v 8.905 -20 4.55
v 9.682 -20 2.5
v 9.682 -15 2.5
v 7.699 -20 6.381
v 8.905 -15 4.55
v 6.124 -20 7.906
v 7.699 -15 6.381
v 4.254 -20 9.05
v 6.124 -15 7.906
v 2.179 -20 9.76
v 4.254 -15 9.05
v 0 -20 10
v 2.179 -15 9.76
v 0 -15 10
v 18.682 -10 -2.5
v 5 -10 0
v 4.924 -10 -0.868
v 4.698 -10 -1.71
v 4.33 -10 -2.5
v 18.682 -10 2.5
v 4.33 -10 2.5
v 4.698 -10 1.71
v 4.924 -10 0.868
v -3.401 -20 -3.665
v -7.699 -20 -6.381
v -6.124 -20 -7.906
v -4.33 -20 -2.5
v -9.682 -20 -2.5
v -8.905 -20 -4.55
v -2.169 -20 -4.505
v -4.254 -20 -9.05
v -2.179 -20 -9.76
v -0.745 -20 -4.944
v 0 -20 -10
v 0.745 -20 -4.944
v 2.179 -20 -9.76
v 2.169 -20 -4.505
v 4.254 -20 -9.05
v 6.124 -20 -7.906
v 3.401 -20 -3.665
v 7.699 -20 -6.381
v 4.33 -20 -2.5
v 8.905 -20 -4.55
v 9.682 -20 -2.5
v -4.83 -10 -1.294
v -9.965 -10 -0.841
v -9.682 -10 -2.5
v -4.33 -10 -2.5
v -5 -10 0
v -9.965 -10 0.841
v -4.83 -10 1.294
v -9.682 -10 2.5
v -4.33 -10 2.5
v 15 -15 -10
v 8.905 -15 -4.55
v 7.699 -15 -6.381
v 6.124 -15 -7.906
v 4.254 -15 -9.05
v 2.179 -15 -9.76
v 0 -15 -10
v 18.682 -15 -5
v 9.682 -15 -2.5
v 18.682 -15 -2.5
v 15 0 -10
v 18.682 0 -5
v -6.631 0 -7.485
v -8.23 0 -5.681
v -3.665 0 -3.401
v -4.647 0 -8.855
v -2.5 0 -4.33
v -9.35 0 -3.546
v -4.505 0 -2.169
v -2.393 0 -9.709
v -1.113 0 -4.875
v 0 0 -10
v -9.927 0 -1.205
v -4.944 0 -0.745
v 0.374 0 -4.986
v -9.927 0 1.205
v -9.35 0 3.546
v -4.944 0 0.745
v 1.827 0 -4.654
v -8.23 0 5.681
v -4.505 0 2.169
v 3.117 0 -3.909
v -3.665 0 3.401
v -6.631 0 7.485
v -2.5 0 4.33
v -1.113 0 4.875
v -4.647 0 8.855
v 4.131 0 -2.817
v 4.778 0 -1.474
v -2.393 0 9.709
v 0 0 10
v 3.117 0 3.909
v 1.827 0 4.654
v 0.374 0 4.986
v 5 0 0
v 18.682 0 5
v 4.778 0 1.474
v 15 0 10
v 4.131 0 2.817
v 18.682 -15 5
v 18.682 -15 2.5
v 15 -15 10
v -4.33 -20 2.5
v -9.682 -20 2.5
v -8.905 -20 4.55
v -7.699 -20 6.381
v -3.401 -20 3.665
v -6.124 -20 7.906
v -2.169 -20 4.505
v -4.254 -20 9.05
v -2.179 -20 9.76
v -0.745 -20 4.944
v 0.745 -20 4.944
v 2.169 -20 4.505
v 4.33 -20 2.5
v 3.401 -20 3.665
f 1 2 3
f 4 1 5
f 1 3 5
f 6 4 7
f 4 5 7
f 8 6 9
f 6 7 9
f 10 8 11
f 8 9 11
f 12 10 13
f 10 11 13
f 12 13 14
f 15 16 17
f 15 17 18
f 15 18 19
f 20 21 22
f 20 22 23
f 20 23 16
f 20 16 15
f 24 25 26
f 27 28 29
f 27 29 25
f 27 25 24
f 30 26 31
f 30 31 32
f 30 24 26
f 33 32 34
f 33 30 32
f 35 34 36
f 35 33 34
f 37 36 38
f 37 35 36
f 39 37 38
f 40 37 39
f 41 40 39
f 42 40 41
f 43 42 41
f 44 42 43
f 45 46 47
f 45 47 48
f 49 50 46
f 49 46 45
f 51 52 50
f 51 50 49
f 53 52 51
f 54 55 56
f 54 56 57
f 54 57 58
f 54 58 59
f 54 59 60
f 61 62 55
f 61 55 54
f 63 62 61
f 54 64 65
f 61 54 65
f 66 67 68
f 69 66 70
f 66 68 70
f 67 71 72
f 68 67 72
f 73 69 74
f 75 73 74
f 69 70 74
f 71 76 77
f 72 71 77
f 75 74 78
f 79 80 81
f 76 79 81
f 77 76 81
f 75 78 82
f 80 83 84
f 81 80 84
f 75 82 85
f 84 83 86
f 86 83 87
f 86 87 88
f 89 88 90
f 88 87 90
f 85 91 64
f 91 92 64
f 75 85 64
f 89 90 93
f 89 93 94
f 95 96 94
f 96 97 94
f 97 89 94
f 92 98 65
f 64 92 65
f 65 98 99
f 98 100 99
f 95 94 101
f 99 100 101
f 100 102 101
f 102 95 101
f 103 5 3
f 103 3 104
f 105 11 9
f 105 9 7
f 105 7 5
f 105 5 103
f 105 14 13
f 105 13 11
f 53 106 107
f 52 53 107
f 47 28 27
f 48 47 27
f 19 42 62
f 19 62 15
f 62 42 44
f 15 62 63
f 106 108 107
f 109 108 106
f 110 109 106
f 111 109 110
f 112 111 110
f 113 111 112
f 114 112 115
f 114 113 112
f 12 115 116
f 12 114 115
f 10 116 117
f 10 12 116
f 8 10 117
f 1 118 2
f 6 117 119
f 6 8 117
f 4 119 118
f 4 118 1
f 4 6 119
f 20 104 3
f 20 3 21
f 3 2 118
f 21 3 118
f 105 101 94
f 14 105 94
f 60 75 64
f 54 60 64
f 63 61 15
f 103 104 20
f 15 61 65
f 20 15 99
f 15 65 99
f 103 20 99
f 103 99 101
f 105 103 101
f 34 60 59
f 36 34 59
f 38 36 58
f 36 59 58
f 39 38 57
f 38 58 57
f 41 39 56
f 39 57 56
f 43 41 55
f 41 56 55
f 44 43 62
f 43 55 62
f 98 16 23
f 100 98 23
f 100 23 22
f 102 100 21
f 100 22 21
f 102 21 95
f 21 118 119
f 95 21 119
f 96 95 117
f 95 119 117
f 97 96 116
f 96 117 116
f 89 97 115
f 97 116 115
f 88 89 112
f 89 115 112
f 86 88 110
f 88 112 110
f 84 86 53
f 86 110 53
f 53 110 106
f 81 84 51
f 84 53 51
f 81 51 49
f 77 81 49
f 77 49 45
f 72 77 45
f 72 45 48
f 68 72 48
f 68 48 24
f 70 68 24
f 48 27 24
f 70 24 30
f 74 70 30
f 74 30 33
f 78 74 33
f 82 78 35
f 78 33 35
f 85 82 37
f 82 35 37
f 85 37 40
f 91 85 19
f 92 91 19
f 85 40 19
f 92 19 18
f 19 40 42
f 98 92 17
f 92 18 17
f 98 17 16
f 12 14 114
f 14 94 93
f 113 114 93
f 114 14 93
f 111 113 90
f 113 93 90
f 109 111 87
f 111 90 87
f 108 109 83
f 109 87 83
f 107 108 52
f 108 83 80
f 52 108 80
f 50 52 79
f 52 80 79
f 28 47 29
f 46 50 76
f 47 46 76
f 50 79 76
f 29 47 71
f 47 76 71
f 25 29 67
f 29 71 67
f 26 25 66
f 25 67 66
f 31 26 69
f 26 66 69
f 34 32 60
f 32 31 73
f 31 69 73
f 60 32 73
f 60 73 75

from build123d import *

# Parameters (mm, degrees)
F1_DEPTH = 20
F2_DEPTH = 15
F3_R     = 5
F4_DEPTH = 20.001
F6_DEPTH = 10
F7_DEPTH = 10


with BuildPart() as f1:
    # F0 (on Front) → F1 (new body)
    with BuildSketch(Plane.XZ):
        with BuildLine():
            ThreePointArc((0, -10), (7.0710678119, -7.0710678119), (10, 0))
            ThreePointArc((10, 0), (7.0710678119, 7.0710678119), (0, 10))
            ThreePointArc((0, 10), (-10, 0), (0, -10))
        make_face()
    extrude(amount=F1_DEPTH)

    # F0 (on Front) → F2 (join)
    with BuildSketch(Plane.XZ):
        with BuildLine():
            ThreePointArc((0, 10), (7.0710678119, 7.0710678119), (10, 0))
            ThreePointArc((10, 0), (7.0710678119, -7.0710678119), (0, -10))
            Line((0, -10), (15, -10))
            Line((15, -10), (18.6824316361, -5))
            Line((18.6824316361, -5), (18.6824316361, 5))
            Line((18.6824316361, 5), (15, 10))
            Line((15, 10), (0, 10))
        make_face()
    extrude(amount=F2_DEPTH)

    # F3 (on face) → F4 (cut, through all)
    with BuildSketch(Plane.XZ.offset(20)):
        Circle(F3_R)
    extrude(amount=-F4_DEPTH, mode=Mode.SUBTRACT)

    # F5 (on face) → F6 (cut)
    with BuildSketch(Plane.XZ.offset(20)):
        with BuildLine():
            ThreePointArc((10, 0), (9.9202969627, 1.2600429248), (9.6824583655, 2.5))
            Line((9.6824583655, 2.5), (4.3301270189, 2.5))
            ThreePointArc((4.3301270189, 2.5), (4.8296291314, 1.2940952255), (5, 0))
            ThreePointArc((5, 0), (4.8296291314, -1.2940952255), (4.3301270189, -2.5))
            Line((4.3301270189, -2.5), (9.6824583655, -2.5))
            ThreePointArc((9.6824583655, -2.5), (9.9202969627, -1.2600429248), (10, 0))
        make_face()
        with BuildLine():
            Line((-4.3301270189, 2.5), (-9.6824583655, 2.5))
            ThreePointArc((-9.6824583655, 2.5), (-10, 0), (-9.6824583655, -2.5))
            Line((-9.6824583655, -2.5), (-4.3301270189, -2.5))
            ThreePointArc((-4.3301270189, -2.5), (-5, 0), (-4.3301270189, 2.5))
        make_face()
    extrude(amount=-F6_DEPTH, mode=Mode.SUBTRACT)

    # F5 (on face) → F7 (cut)
    with BuildSketch(Plane.XZ.offset(20)):
        with BuildLine():
            Line((18.6824316361, -2.5), (18.6824316361, 2.5))
            Line((18.6824316361, 2.5), (9.6824583655, 2.5))
            ThreePointArc((9.6824583655, 2.5), (9.9202969627, 1.2600429248), (10, 0))
            ThreePointArc((10, 0), (9.9202969627, -1.2600429248), (9.6824583655, -2.5))
            Line((9.6824583655, -2.5), (18.6824316361, -2.5))
        make_face()
    extrude(amount=-F7_DEPTH, mode=Mode.SUBTRACT)


solid = f1.part
